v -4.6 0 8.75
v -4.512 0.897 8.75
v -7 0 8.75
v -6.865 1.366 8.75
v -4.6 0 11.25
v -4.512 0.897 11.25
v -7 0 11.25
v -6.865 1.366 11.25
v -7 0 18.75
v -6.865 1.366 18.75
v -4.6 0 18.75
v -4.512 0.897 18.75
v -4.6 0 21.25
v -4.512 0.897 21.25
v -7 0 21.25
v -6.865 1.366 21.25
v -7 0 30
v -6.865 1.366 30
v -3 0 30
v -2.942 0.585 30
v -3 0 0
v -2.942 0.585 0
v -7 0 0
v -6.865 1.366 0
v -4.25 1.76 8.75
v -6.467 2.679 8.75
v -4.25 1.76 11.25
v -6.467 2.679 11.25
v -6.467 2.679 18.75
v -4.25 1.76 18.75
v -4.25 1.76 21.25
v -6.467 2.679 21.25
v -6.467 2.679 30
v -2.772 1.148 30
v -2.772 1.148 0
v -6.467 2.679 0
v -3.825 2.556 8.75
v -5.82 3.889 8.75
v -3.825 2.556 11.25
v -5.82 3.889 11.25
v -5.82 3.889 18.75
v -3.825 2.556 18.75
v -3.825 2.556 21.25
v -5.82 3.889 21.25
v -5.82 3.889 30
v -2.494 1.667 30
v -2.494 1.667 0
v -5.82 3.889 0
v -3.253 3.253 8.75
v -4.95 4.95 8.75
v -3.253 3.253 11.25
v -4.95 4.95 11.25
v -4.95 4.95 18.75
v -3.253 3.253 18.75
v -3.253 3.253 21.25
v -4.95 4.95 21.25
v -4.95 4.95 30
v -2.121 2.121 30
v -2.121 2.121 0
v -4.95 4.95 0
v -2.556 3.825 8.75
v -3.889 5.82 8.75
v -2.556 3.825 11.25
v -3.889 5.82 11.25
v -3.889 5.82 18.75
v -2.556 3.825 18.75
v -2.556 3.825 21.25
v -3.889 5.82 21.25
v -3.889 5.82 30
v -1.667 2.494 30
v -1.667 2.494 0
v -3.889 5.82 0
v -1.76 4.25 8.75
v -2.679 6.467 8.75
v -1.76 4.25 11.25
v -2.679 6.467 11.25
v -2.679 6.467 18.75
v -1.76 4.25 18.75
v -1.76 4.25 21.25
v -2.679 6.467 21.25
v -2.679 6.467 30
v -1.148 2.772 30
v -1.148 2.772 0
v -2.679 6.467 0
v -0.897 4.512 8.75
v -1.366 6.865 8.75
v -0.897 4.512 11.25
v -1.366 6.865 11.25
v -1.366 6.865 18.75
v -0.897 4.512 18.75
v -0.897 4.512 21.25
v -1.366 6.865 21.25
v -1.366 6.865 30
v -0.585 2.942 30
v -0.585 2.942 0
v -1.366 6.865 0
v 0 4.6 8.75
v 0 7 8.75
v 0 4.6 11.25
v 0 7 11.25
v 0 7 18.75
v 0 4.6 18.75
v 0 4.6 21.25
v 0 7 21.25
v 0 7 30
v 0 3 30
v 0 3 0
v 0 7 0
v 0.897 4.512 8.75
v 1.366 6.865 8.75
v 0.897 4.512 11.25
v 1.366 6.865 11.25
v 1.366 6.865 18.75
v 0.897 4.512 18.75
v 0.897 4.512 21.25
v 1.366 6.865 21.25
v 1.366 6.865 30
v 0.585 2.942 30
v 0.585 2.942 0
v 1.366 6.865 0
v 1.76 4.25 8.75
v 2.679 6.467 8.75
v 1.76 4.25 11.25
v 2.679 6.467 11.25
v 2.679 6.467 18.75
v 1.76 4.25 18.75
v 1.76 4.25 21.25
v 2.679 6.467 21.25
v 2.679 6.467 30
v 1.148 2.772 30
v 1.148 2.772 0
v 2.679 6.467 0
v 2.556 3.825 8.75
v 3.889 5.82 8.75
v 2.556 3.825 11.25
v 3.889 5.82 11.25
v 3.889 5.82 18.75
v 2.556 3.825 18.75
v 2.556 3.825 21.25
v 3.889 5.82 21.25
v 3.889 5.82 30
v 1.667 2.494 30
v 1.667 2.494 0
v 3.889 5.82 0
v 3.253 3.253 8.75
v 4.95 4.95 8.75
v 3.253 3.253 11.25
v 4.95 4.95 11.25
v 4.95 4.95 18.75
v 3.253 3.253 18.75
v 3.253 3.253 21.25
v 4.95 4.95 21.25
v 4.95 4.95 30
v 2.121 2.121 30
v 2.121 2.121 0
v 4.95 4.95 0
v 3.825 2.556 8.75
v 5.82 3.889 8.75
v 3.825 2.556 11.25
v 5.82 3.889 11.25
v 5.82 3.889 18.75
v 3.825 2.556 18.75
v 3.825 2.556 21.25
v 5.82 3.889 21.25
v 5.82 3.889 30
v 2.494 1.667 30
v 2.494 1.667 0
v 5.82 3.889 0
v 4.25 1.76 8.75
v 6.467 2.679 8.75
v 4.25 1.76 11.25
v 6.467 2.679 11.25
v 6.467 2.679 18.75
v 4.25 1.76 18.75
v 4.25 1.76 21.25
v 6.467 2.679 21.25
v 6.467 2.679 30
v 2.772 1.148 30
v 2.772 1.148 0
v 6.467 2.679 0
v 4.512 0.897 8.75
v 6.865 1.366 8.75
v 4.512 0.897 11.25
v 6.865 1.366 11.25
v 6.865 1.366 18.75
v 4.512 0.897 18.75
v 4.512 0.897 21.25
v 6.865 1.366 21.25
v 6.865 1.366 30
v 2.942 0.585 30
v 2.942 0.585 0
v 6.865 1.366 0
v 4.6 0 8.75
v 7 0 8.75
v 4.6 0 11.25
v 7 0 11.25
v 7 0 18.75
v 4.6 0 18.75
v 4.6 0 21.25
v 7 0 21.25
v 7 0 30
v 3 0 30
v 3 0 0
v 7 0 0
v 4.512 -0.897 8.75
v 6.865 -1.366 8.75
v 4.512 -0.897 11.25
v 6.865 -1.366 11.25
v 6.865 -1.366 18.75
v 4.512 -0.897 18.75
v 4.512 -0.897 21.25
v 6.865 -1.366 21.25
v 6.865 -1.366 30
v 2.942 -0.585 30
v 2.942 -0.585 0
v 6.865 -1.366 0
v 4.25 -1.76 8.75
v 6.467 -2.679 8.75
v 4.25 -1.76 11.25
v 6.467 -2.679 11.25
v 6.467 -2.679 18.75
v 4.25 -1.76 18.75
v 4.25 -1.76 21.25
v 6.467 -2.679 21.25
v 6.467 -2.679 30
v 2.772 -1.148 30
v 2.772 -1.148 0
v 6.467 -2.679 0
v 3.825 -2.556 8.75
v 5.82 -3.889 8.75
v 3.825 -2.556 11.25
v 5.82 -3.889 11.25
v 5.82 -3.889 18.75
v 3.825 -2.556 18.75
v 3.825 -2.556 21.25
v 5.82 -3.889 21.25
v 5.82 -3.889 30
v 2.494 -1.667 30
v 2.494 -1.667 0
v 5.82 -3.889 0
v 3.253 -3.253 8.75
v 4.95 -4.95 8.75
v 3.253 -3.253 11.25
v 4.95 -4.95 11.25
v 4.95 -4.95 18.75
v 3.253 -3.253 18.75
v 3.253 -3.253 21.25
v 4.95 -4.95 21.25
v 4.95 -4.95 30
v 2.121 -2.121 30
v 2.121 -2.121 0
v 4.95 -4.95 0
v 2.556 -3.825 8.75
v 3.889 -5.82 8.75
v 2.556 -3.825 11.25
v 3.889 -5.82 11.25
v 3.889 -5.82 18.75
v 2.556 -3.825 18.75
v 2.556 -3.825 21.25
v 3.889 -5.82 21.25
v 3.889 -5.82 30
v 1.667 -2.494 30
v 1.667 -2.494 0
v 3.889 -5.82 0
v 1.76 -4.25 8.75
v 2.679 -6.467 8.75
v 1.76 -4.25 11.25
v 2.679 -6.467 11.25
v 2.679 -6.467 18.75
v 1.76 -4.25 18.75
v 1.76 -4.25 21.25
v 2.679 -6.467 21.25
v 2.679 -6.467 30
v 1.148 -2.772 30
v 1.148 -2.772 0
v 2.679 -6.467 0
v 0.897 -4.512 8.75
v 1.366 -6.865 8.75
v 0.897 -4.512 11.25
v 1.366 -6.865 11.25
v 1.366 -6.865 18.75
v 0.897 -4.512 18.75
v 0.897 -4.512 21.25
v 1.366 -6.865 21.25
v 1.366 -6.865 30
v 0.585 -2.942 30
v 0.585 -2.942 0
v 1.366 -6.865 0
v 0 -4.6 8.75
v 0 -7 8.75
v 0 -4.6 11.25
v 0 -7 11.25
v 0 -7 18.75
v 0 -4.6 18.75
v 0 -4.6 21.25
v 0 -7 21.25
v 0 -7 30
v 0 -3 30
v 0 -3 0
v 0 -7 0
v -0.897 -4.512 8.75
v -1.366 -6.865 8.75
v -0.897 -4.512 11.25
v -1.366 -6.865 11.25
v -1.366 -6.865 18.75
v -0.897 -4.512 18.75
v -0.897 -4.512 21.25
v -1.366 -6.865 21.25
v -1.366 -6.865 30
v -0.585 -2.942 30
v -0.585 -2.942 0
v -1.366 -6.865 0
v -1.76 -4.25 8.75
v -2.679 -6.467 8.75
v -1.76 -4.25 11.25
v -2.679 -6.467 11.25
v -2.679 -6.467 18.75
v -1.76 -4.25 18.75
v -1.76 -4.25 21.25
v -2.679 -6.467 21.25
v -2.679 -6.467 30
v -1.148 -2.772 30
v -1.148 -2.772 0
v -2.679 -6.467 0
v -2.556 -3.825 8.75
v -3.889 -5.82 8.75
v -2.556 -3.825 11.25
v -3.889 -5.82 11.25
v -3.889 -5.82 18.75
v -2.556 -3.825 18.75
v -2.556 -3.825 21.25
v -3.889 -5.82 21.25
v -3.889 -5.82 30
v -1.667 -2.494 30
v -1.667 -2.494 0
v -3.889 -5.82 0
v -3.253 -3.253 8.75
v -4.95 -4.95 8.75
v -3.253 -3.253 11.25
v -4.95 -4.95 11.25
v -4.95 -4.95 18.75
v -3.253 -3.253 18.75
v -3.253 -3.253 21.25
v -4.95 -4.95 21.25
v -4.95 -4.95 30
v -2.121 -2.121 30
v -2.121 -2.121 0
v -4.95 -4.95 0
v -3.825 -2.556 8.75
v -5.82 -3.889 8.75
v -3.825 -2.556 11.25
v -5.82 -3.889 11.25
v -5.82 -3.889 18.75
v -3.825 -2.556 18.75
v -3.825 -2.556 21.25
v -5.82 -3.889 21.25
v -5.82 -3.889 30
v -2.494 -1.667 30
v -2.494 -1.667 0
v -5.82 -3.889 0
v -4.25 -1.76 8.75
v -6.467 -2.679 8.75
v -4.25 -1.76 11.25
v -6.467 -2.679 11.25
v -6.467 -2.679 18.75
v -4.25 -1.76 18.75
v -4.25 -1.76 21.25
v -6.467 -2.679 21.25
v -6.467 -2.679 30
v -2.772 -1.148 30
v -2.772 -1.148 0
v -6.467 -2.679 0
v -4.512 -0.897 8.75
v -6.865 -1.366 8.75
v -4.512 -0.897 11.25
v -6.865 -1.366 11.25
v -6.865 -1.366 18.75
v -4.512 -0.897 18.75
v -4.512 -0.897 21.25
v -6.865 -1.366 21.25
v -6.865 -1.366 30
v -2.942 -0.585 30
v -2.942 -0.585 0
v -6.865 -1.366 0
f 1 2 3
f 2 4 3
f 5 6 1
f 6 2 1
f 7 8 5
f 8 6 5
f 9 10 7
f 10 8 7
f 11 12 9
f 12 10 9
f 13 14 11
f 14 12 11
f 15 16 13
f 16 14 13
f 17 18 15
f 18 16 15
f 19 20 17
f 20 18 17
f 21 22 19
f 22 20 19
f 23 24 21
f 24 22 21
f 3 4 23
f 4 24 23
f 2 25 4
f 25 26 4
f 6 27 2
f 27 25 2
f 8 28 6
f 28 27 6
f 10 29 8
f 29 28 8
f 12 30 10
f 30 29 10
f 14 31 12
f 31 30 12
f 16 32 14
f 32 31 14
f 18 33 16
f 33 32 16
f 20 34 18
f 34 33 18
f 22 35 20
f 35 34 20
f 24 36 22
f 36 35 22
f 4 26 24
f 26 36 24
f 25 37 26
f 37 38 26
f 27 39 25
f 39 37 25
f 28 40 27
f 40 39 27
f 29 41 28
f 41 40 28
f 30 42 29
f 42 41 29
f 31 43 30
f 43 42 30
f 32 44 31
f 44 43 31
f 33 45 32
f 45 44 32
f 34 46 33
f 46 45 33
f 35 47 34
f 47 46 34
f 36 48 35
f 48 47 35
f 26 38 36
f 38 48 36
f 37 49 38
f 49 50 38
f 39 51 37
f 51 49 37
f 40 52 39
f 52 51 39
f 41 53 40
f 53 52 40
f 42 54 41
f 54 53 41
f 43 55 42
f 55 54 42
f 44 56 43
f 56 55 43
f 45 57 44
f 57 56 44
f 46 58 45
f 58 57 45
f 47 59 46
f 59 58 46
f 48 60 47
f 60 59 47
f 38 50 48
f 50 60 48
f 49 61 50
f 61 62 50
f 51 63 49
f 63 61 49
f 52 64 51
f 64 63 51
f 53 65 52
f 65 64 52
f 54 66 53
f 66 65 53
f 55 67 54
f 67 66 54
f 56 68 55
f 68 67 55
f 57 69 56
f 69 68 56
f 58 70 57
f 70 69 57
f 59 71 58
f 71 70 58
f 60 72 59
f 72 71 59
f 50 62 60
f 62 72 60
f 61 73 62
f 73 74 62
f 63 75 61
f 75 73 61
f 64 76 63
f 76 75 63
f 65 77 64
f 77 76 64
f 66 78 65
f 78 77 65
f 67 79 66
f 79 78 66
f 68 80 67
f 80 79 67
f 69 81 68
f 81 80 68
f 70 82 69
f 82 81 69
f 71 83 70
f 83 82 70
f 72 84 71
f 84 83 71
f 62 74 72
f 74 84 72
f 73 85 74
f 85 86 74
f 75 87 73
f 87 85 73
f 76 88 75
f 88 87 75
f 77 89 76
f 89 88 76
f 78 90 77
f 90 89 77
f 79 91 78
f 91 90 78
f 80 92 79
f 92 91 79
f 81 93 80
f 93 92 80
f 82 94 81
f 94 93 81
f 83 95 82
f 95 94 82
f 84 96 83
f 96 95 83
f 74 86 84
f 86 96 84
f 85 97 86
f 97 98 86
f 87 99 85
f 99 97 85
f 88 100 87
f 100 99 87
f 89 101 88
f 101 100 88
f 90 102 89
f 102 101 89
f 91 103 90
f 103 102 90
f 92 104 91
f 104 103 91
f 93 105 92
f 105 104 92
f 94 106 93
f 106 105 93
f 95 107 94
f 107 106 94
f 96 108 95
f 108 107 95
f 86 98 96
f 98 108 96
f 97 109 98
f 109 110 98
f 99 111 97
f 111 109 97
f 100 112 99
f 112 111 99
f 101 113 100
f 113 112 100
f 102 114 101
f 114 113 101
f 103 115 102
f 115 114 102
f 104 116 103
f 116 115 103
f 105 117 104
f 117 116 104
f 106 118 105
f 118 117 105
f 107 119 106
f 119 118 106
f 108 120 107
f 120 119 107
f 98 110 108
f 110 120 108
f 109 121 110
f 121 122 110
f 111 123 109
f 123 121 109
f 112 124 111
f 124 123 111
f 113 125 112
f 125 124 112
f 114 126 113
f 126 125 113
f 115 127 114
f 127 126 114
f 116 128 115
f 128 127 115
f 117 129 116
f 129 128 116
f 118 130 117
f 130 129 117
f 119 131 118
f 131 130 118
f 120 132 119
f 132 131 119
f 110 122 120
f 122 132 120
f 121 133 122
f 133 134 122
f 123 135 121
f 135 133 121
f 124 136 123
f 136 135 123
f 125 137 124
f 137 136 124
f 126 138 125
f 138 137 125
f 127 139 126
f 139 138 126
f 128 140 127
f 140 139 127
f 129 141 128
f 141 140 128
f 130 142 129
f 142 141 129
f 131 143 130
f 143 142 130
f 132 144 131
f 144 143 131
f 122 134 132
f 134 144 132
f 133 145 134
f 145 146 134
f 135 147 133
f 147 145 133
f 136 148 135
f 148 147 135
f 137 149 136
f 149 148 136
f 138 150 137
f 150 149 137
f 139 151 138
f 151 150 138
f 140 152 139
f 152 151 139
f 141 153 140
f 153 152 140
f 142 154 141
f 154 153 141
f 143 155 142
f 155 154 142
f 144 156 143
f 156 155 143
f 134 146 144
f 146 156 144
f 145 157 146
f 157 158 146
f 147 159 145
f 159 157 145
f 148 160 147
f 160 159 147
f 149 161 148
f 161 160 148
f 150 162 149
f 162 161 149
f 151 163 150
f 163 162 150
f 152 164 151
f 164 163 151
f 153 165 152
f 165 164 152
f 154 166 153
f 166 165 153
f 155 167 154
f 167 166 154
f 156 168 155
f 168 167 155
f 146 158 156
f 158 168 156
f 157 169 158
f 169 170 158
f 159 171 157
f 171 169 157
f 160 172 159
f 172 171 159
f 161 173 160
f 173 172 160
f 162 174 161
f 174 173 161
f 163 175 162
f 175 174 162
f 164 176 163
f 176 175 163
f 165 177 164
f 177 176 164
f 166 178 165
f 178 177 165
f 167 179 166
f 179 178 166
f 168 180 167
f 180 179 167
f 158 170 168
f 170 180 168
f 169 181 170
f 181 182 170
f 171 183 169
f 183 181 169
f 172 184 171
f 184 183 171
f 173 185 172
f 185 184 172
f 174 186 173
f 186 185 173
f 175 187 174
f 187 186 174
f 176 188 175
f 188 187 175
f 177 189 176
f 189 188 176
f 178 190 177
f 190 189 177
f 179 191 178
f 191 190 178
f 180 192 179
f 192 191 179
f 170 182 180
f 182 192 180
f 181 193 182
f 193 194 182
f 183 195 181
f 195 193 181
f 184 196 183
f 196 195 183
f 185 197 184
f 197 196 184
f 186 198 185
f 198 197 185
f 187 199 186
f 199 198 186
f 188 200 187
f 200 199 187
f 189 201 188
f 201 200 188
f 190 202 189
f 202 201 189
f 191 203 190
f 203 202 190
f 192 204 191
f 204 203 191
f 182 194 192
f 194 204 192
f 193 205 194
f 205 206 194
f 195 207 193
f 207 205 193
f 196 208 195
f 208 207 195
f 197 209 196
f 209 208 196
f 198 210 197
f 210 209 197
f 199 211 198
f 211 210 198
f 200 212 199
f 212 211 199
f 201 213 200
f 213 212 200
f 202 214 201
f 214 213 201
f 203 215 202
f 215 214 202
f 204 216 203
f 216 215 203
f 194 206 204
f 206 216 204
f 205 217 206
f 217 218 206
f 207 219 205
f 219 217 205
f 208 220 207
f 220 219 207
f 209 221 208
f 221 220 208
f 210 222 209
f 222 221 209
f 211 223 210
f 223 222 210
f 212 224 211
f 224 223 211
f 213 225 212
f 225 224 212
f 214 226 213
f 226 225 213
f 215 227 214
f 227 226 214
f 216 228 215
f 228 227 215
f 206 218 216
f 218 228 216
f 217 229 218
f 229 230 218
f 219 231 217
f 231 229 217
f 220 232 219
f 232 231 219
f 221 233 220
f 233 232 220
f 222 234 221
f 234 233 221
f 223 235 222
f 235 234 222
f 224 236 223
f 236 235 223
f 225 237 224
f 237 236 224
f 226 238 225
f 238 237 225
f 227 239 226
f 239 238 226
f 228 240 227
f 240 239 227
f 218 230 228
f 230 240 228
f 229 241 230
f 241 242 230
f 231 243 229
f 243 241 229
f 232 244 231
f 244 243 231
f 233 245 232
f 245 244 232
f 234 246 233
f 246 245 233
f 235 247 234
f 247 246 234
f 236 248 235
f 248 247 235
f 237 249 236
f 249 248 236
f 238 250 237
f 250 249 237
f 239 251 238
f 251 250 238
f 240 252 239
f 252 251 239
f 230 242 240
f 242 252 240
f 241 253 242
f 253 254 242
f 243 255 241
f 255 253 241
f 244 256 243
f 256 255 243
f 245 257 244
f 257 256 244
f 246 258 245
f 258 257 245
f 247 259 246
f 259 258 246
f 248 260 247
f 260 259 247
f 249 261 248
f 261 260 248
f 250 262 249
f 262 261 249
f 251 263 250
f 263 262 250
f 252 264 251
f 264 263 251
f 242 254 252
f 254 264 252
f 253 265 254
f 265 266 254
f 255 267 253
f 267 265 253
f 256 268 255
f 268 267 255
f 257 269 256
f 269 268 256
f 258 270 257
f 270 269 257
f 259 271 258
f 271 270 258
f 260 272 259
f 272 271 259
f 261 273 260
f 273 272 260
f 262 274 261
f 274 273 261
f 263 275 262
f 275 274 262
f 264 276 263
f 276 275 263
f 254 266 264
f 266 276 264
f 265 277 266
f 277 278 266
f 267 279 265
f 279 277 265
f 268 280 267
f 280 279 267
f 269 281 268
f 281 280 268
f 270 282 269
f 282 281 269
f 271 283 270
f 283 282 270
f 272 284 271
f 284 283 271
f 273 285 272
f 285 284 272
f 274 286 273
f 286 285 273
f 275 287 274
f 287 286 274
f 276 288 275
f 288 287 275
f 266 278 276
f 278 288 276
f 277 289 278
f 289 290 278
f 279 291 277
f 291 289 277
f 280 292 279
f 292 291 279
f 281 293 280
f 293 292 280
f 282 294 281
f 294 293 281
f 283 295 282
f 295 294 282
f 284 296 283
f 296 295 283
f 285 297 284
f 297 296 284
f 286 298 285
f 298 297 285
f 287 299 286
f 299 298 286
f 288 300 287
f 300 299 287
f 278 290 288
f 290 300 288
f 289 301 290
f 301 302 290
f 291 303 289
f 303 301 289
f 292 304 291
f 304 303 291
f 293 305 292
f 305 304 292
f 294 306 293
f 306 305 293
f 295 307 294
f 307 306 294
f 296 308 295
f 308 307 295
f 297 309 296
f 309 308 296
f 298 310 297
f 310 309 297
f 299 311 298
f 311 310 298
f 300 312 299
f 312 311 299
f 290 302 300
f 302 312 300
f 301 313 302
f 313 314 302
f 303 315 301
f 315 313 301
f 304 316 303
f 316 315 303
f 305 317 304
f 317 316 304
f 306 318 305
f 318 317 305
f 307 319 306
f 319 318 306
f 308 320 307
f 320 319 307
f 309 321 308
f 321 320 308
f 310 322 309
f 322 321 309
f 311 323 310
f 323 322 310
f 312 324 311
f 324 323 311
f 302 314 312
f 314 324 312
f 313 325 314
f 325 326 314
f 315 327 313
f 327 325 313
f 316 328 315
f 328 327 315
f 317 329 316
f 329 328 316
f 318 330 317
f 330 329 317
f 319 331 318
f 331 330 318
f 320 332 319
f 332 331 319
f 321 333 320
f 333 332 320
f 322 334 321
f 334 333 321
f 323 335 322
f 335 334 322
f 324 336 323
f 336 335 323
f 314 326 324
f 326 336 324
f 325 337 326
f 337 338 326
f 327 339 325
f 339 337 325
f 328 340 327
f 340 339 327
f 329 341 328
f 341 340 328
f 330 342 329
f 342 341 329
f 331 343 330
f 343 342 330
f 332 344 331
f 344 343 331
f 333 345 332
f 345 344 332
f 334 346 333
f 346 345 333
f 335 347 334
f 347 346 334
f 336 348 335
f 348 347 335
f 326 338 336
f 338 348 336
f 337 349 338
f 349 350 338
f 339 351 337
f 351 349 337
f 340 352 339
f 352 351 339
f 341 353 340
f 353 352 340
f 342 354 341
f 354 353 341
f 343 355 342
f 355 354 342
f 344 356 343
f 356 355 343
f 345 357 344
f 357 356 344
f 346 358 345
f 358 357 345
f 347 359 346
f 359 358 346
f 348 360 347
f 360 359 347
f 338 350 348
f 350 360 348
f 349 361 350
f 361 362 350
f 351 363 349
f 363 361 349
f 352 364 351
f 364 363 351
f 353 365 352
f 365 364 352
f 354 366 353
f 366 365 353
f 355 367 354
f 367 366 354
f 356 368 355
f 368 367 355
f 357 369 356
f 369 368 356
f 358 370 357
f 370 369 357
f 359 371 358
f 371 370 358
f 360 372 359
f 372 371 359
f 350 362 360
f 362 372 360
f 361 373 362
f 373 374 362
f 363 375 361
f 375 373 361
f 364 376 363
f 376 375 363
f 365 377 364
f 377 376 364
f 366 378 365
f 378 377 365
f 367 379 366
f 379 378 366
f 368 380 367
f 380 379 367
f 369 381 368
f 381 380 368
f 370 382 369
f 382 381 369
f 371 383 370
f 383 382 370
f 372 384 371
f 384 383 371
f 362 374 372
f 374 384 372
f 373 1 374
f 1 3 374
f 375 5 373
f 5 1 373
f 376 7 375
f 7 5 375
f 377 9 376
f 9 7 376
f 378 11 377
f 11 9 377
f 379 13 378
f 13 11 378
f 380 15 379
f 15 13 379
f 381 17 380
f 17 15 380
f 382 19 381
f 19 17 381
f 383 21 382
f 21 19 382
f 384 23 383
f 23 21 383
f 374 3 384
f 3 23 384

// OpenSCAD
$fn = 32;

// ----------------------------------------------------------------------
// Grooved revolve: stepped, bore R3
// ----------------------------------------------------------------------

// --- parameters (mm) ---
bore_r = 3;               // bore radius
outer_r = 7;              // outer radius of the body
total_h = 30;             // overall height, Z
wall = 4;                 // radial wall thickness
groove_w = 2.5;           // groove width
groove_d = 2.4;           // groove depth
grooves = 2;              // number of outer grooves

bbox_x = 2 * outer_r;  // full diameter
bore_d = 2 * bore_r;  // bore diameter
body_d = 2 * outer_r;  // body diameter
revolve_angle = 360;  // full turn around the Z axis

profile = [[3, 0], [7, 0], [7, 8.75], [4.6, 8.75], [4.6, 11.25], [7, 11.25], [7, 18.75], [4.6, 18.75], [4.6, 21.25], [7, 21.25], [7, 30], [3, 30]];  // primary outline, 12 points, counter clockwise

// --- the one profile operation ---
rotate_extrude(angle = revolve_angle) polygon(points = profile);
